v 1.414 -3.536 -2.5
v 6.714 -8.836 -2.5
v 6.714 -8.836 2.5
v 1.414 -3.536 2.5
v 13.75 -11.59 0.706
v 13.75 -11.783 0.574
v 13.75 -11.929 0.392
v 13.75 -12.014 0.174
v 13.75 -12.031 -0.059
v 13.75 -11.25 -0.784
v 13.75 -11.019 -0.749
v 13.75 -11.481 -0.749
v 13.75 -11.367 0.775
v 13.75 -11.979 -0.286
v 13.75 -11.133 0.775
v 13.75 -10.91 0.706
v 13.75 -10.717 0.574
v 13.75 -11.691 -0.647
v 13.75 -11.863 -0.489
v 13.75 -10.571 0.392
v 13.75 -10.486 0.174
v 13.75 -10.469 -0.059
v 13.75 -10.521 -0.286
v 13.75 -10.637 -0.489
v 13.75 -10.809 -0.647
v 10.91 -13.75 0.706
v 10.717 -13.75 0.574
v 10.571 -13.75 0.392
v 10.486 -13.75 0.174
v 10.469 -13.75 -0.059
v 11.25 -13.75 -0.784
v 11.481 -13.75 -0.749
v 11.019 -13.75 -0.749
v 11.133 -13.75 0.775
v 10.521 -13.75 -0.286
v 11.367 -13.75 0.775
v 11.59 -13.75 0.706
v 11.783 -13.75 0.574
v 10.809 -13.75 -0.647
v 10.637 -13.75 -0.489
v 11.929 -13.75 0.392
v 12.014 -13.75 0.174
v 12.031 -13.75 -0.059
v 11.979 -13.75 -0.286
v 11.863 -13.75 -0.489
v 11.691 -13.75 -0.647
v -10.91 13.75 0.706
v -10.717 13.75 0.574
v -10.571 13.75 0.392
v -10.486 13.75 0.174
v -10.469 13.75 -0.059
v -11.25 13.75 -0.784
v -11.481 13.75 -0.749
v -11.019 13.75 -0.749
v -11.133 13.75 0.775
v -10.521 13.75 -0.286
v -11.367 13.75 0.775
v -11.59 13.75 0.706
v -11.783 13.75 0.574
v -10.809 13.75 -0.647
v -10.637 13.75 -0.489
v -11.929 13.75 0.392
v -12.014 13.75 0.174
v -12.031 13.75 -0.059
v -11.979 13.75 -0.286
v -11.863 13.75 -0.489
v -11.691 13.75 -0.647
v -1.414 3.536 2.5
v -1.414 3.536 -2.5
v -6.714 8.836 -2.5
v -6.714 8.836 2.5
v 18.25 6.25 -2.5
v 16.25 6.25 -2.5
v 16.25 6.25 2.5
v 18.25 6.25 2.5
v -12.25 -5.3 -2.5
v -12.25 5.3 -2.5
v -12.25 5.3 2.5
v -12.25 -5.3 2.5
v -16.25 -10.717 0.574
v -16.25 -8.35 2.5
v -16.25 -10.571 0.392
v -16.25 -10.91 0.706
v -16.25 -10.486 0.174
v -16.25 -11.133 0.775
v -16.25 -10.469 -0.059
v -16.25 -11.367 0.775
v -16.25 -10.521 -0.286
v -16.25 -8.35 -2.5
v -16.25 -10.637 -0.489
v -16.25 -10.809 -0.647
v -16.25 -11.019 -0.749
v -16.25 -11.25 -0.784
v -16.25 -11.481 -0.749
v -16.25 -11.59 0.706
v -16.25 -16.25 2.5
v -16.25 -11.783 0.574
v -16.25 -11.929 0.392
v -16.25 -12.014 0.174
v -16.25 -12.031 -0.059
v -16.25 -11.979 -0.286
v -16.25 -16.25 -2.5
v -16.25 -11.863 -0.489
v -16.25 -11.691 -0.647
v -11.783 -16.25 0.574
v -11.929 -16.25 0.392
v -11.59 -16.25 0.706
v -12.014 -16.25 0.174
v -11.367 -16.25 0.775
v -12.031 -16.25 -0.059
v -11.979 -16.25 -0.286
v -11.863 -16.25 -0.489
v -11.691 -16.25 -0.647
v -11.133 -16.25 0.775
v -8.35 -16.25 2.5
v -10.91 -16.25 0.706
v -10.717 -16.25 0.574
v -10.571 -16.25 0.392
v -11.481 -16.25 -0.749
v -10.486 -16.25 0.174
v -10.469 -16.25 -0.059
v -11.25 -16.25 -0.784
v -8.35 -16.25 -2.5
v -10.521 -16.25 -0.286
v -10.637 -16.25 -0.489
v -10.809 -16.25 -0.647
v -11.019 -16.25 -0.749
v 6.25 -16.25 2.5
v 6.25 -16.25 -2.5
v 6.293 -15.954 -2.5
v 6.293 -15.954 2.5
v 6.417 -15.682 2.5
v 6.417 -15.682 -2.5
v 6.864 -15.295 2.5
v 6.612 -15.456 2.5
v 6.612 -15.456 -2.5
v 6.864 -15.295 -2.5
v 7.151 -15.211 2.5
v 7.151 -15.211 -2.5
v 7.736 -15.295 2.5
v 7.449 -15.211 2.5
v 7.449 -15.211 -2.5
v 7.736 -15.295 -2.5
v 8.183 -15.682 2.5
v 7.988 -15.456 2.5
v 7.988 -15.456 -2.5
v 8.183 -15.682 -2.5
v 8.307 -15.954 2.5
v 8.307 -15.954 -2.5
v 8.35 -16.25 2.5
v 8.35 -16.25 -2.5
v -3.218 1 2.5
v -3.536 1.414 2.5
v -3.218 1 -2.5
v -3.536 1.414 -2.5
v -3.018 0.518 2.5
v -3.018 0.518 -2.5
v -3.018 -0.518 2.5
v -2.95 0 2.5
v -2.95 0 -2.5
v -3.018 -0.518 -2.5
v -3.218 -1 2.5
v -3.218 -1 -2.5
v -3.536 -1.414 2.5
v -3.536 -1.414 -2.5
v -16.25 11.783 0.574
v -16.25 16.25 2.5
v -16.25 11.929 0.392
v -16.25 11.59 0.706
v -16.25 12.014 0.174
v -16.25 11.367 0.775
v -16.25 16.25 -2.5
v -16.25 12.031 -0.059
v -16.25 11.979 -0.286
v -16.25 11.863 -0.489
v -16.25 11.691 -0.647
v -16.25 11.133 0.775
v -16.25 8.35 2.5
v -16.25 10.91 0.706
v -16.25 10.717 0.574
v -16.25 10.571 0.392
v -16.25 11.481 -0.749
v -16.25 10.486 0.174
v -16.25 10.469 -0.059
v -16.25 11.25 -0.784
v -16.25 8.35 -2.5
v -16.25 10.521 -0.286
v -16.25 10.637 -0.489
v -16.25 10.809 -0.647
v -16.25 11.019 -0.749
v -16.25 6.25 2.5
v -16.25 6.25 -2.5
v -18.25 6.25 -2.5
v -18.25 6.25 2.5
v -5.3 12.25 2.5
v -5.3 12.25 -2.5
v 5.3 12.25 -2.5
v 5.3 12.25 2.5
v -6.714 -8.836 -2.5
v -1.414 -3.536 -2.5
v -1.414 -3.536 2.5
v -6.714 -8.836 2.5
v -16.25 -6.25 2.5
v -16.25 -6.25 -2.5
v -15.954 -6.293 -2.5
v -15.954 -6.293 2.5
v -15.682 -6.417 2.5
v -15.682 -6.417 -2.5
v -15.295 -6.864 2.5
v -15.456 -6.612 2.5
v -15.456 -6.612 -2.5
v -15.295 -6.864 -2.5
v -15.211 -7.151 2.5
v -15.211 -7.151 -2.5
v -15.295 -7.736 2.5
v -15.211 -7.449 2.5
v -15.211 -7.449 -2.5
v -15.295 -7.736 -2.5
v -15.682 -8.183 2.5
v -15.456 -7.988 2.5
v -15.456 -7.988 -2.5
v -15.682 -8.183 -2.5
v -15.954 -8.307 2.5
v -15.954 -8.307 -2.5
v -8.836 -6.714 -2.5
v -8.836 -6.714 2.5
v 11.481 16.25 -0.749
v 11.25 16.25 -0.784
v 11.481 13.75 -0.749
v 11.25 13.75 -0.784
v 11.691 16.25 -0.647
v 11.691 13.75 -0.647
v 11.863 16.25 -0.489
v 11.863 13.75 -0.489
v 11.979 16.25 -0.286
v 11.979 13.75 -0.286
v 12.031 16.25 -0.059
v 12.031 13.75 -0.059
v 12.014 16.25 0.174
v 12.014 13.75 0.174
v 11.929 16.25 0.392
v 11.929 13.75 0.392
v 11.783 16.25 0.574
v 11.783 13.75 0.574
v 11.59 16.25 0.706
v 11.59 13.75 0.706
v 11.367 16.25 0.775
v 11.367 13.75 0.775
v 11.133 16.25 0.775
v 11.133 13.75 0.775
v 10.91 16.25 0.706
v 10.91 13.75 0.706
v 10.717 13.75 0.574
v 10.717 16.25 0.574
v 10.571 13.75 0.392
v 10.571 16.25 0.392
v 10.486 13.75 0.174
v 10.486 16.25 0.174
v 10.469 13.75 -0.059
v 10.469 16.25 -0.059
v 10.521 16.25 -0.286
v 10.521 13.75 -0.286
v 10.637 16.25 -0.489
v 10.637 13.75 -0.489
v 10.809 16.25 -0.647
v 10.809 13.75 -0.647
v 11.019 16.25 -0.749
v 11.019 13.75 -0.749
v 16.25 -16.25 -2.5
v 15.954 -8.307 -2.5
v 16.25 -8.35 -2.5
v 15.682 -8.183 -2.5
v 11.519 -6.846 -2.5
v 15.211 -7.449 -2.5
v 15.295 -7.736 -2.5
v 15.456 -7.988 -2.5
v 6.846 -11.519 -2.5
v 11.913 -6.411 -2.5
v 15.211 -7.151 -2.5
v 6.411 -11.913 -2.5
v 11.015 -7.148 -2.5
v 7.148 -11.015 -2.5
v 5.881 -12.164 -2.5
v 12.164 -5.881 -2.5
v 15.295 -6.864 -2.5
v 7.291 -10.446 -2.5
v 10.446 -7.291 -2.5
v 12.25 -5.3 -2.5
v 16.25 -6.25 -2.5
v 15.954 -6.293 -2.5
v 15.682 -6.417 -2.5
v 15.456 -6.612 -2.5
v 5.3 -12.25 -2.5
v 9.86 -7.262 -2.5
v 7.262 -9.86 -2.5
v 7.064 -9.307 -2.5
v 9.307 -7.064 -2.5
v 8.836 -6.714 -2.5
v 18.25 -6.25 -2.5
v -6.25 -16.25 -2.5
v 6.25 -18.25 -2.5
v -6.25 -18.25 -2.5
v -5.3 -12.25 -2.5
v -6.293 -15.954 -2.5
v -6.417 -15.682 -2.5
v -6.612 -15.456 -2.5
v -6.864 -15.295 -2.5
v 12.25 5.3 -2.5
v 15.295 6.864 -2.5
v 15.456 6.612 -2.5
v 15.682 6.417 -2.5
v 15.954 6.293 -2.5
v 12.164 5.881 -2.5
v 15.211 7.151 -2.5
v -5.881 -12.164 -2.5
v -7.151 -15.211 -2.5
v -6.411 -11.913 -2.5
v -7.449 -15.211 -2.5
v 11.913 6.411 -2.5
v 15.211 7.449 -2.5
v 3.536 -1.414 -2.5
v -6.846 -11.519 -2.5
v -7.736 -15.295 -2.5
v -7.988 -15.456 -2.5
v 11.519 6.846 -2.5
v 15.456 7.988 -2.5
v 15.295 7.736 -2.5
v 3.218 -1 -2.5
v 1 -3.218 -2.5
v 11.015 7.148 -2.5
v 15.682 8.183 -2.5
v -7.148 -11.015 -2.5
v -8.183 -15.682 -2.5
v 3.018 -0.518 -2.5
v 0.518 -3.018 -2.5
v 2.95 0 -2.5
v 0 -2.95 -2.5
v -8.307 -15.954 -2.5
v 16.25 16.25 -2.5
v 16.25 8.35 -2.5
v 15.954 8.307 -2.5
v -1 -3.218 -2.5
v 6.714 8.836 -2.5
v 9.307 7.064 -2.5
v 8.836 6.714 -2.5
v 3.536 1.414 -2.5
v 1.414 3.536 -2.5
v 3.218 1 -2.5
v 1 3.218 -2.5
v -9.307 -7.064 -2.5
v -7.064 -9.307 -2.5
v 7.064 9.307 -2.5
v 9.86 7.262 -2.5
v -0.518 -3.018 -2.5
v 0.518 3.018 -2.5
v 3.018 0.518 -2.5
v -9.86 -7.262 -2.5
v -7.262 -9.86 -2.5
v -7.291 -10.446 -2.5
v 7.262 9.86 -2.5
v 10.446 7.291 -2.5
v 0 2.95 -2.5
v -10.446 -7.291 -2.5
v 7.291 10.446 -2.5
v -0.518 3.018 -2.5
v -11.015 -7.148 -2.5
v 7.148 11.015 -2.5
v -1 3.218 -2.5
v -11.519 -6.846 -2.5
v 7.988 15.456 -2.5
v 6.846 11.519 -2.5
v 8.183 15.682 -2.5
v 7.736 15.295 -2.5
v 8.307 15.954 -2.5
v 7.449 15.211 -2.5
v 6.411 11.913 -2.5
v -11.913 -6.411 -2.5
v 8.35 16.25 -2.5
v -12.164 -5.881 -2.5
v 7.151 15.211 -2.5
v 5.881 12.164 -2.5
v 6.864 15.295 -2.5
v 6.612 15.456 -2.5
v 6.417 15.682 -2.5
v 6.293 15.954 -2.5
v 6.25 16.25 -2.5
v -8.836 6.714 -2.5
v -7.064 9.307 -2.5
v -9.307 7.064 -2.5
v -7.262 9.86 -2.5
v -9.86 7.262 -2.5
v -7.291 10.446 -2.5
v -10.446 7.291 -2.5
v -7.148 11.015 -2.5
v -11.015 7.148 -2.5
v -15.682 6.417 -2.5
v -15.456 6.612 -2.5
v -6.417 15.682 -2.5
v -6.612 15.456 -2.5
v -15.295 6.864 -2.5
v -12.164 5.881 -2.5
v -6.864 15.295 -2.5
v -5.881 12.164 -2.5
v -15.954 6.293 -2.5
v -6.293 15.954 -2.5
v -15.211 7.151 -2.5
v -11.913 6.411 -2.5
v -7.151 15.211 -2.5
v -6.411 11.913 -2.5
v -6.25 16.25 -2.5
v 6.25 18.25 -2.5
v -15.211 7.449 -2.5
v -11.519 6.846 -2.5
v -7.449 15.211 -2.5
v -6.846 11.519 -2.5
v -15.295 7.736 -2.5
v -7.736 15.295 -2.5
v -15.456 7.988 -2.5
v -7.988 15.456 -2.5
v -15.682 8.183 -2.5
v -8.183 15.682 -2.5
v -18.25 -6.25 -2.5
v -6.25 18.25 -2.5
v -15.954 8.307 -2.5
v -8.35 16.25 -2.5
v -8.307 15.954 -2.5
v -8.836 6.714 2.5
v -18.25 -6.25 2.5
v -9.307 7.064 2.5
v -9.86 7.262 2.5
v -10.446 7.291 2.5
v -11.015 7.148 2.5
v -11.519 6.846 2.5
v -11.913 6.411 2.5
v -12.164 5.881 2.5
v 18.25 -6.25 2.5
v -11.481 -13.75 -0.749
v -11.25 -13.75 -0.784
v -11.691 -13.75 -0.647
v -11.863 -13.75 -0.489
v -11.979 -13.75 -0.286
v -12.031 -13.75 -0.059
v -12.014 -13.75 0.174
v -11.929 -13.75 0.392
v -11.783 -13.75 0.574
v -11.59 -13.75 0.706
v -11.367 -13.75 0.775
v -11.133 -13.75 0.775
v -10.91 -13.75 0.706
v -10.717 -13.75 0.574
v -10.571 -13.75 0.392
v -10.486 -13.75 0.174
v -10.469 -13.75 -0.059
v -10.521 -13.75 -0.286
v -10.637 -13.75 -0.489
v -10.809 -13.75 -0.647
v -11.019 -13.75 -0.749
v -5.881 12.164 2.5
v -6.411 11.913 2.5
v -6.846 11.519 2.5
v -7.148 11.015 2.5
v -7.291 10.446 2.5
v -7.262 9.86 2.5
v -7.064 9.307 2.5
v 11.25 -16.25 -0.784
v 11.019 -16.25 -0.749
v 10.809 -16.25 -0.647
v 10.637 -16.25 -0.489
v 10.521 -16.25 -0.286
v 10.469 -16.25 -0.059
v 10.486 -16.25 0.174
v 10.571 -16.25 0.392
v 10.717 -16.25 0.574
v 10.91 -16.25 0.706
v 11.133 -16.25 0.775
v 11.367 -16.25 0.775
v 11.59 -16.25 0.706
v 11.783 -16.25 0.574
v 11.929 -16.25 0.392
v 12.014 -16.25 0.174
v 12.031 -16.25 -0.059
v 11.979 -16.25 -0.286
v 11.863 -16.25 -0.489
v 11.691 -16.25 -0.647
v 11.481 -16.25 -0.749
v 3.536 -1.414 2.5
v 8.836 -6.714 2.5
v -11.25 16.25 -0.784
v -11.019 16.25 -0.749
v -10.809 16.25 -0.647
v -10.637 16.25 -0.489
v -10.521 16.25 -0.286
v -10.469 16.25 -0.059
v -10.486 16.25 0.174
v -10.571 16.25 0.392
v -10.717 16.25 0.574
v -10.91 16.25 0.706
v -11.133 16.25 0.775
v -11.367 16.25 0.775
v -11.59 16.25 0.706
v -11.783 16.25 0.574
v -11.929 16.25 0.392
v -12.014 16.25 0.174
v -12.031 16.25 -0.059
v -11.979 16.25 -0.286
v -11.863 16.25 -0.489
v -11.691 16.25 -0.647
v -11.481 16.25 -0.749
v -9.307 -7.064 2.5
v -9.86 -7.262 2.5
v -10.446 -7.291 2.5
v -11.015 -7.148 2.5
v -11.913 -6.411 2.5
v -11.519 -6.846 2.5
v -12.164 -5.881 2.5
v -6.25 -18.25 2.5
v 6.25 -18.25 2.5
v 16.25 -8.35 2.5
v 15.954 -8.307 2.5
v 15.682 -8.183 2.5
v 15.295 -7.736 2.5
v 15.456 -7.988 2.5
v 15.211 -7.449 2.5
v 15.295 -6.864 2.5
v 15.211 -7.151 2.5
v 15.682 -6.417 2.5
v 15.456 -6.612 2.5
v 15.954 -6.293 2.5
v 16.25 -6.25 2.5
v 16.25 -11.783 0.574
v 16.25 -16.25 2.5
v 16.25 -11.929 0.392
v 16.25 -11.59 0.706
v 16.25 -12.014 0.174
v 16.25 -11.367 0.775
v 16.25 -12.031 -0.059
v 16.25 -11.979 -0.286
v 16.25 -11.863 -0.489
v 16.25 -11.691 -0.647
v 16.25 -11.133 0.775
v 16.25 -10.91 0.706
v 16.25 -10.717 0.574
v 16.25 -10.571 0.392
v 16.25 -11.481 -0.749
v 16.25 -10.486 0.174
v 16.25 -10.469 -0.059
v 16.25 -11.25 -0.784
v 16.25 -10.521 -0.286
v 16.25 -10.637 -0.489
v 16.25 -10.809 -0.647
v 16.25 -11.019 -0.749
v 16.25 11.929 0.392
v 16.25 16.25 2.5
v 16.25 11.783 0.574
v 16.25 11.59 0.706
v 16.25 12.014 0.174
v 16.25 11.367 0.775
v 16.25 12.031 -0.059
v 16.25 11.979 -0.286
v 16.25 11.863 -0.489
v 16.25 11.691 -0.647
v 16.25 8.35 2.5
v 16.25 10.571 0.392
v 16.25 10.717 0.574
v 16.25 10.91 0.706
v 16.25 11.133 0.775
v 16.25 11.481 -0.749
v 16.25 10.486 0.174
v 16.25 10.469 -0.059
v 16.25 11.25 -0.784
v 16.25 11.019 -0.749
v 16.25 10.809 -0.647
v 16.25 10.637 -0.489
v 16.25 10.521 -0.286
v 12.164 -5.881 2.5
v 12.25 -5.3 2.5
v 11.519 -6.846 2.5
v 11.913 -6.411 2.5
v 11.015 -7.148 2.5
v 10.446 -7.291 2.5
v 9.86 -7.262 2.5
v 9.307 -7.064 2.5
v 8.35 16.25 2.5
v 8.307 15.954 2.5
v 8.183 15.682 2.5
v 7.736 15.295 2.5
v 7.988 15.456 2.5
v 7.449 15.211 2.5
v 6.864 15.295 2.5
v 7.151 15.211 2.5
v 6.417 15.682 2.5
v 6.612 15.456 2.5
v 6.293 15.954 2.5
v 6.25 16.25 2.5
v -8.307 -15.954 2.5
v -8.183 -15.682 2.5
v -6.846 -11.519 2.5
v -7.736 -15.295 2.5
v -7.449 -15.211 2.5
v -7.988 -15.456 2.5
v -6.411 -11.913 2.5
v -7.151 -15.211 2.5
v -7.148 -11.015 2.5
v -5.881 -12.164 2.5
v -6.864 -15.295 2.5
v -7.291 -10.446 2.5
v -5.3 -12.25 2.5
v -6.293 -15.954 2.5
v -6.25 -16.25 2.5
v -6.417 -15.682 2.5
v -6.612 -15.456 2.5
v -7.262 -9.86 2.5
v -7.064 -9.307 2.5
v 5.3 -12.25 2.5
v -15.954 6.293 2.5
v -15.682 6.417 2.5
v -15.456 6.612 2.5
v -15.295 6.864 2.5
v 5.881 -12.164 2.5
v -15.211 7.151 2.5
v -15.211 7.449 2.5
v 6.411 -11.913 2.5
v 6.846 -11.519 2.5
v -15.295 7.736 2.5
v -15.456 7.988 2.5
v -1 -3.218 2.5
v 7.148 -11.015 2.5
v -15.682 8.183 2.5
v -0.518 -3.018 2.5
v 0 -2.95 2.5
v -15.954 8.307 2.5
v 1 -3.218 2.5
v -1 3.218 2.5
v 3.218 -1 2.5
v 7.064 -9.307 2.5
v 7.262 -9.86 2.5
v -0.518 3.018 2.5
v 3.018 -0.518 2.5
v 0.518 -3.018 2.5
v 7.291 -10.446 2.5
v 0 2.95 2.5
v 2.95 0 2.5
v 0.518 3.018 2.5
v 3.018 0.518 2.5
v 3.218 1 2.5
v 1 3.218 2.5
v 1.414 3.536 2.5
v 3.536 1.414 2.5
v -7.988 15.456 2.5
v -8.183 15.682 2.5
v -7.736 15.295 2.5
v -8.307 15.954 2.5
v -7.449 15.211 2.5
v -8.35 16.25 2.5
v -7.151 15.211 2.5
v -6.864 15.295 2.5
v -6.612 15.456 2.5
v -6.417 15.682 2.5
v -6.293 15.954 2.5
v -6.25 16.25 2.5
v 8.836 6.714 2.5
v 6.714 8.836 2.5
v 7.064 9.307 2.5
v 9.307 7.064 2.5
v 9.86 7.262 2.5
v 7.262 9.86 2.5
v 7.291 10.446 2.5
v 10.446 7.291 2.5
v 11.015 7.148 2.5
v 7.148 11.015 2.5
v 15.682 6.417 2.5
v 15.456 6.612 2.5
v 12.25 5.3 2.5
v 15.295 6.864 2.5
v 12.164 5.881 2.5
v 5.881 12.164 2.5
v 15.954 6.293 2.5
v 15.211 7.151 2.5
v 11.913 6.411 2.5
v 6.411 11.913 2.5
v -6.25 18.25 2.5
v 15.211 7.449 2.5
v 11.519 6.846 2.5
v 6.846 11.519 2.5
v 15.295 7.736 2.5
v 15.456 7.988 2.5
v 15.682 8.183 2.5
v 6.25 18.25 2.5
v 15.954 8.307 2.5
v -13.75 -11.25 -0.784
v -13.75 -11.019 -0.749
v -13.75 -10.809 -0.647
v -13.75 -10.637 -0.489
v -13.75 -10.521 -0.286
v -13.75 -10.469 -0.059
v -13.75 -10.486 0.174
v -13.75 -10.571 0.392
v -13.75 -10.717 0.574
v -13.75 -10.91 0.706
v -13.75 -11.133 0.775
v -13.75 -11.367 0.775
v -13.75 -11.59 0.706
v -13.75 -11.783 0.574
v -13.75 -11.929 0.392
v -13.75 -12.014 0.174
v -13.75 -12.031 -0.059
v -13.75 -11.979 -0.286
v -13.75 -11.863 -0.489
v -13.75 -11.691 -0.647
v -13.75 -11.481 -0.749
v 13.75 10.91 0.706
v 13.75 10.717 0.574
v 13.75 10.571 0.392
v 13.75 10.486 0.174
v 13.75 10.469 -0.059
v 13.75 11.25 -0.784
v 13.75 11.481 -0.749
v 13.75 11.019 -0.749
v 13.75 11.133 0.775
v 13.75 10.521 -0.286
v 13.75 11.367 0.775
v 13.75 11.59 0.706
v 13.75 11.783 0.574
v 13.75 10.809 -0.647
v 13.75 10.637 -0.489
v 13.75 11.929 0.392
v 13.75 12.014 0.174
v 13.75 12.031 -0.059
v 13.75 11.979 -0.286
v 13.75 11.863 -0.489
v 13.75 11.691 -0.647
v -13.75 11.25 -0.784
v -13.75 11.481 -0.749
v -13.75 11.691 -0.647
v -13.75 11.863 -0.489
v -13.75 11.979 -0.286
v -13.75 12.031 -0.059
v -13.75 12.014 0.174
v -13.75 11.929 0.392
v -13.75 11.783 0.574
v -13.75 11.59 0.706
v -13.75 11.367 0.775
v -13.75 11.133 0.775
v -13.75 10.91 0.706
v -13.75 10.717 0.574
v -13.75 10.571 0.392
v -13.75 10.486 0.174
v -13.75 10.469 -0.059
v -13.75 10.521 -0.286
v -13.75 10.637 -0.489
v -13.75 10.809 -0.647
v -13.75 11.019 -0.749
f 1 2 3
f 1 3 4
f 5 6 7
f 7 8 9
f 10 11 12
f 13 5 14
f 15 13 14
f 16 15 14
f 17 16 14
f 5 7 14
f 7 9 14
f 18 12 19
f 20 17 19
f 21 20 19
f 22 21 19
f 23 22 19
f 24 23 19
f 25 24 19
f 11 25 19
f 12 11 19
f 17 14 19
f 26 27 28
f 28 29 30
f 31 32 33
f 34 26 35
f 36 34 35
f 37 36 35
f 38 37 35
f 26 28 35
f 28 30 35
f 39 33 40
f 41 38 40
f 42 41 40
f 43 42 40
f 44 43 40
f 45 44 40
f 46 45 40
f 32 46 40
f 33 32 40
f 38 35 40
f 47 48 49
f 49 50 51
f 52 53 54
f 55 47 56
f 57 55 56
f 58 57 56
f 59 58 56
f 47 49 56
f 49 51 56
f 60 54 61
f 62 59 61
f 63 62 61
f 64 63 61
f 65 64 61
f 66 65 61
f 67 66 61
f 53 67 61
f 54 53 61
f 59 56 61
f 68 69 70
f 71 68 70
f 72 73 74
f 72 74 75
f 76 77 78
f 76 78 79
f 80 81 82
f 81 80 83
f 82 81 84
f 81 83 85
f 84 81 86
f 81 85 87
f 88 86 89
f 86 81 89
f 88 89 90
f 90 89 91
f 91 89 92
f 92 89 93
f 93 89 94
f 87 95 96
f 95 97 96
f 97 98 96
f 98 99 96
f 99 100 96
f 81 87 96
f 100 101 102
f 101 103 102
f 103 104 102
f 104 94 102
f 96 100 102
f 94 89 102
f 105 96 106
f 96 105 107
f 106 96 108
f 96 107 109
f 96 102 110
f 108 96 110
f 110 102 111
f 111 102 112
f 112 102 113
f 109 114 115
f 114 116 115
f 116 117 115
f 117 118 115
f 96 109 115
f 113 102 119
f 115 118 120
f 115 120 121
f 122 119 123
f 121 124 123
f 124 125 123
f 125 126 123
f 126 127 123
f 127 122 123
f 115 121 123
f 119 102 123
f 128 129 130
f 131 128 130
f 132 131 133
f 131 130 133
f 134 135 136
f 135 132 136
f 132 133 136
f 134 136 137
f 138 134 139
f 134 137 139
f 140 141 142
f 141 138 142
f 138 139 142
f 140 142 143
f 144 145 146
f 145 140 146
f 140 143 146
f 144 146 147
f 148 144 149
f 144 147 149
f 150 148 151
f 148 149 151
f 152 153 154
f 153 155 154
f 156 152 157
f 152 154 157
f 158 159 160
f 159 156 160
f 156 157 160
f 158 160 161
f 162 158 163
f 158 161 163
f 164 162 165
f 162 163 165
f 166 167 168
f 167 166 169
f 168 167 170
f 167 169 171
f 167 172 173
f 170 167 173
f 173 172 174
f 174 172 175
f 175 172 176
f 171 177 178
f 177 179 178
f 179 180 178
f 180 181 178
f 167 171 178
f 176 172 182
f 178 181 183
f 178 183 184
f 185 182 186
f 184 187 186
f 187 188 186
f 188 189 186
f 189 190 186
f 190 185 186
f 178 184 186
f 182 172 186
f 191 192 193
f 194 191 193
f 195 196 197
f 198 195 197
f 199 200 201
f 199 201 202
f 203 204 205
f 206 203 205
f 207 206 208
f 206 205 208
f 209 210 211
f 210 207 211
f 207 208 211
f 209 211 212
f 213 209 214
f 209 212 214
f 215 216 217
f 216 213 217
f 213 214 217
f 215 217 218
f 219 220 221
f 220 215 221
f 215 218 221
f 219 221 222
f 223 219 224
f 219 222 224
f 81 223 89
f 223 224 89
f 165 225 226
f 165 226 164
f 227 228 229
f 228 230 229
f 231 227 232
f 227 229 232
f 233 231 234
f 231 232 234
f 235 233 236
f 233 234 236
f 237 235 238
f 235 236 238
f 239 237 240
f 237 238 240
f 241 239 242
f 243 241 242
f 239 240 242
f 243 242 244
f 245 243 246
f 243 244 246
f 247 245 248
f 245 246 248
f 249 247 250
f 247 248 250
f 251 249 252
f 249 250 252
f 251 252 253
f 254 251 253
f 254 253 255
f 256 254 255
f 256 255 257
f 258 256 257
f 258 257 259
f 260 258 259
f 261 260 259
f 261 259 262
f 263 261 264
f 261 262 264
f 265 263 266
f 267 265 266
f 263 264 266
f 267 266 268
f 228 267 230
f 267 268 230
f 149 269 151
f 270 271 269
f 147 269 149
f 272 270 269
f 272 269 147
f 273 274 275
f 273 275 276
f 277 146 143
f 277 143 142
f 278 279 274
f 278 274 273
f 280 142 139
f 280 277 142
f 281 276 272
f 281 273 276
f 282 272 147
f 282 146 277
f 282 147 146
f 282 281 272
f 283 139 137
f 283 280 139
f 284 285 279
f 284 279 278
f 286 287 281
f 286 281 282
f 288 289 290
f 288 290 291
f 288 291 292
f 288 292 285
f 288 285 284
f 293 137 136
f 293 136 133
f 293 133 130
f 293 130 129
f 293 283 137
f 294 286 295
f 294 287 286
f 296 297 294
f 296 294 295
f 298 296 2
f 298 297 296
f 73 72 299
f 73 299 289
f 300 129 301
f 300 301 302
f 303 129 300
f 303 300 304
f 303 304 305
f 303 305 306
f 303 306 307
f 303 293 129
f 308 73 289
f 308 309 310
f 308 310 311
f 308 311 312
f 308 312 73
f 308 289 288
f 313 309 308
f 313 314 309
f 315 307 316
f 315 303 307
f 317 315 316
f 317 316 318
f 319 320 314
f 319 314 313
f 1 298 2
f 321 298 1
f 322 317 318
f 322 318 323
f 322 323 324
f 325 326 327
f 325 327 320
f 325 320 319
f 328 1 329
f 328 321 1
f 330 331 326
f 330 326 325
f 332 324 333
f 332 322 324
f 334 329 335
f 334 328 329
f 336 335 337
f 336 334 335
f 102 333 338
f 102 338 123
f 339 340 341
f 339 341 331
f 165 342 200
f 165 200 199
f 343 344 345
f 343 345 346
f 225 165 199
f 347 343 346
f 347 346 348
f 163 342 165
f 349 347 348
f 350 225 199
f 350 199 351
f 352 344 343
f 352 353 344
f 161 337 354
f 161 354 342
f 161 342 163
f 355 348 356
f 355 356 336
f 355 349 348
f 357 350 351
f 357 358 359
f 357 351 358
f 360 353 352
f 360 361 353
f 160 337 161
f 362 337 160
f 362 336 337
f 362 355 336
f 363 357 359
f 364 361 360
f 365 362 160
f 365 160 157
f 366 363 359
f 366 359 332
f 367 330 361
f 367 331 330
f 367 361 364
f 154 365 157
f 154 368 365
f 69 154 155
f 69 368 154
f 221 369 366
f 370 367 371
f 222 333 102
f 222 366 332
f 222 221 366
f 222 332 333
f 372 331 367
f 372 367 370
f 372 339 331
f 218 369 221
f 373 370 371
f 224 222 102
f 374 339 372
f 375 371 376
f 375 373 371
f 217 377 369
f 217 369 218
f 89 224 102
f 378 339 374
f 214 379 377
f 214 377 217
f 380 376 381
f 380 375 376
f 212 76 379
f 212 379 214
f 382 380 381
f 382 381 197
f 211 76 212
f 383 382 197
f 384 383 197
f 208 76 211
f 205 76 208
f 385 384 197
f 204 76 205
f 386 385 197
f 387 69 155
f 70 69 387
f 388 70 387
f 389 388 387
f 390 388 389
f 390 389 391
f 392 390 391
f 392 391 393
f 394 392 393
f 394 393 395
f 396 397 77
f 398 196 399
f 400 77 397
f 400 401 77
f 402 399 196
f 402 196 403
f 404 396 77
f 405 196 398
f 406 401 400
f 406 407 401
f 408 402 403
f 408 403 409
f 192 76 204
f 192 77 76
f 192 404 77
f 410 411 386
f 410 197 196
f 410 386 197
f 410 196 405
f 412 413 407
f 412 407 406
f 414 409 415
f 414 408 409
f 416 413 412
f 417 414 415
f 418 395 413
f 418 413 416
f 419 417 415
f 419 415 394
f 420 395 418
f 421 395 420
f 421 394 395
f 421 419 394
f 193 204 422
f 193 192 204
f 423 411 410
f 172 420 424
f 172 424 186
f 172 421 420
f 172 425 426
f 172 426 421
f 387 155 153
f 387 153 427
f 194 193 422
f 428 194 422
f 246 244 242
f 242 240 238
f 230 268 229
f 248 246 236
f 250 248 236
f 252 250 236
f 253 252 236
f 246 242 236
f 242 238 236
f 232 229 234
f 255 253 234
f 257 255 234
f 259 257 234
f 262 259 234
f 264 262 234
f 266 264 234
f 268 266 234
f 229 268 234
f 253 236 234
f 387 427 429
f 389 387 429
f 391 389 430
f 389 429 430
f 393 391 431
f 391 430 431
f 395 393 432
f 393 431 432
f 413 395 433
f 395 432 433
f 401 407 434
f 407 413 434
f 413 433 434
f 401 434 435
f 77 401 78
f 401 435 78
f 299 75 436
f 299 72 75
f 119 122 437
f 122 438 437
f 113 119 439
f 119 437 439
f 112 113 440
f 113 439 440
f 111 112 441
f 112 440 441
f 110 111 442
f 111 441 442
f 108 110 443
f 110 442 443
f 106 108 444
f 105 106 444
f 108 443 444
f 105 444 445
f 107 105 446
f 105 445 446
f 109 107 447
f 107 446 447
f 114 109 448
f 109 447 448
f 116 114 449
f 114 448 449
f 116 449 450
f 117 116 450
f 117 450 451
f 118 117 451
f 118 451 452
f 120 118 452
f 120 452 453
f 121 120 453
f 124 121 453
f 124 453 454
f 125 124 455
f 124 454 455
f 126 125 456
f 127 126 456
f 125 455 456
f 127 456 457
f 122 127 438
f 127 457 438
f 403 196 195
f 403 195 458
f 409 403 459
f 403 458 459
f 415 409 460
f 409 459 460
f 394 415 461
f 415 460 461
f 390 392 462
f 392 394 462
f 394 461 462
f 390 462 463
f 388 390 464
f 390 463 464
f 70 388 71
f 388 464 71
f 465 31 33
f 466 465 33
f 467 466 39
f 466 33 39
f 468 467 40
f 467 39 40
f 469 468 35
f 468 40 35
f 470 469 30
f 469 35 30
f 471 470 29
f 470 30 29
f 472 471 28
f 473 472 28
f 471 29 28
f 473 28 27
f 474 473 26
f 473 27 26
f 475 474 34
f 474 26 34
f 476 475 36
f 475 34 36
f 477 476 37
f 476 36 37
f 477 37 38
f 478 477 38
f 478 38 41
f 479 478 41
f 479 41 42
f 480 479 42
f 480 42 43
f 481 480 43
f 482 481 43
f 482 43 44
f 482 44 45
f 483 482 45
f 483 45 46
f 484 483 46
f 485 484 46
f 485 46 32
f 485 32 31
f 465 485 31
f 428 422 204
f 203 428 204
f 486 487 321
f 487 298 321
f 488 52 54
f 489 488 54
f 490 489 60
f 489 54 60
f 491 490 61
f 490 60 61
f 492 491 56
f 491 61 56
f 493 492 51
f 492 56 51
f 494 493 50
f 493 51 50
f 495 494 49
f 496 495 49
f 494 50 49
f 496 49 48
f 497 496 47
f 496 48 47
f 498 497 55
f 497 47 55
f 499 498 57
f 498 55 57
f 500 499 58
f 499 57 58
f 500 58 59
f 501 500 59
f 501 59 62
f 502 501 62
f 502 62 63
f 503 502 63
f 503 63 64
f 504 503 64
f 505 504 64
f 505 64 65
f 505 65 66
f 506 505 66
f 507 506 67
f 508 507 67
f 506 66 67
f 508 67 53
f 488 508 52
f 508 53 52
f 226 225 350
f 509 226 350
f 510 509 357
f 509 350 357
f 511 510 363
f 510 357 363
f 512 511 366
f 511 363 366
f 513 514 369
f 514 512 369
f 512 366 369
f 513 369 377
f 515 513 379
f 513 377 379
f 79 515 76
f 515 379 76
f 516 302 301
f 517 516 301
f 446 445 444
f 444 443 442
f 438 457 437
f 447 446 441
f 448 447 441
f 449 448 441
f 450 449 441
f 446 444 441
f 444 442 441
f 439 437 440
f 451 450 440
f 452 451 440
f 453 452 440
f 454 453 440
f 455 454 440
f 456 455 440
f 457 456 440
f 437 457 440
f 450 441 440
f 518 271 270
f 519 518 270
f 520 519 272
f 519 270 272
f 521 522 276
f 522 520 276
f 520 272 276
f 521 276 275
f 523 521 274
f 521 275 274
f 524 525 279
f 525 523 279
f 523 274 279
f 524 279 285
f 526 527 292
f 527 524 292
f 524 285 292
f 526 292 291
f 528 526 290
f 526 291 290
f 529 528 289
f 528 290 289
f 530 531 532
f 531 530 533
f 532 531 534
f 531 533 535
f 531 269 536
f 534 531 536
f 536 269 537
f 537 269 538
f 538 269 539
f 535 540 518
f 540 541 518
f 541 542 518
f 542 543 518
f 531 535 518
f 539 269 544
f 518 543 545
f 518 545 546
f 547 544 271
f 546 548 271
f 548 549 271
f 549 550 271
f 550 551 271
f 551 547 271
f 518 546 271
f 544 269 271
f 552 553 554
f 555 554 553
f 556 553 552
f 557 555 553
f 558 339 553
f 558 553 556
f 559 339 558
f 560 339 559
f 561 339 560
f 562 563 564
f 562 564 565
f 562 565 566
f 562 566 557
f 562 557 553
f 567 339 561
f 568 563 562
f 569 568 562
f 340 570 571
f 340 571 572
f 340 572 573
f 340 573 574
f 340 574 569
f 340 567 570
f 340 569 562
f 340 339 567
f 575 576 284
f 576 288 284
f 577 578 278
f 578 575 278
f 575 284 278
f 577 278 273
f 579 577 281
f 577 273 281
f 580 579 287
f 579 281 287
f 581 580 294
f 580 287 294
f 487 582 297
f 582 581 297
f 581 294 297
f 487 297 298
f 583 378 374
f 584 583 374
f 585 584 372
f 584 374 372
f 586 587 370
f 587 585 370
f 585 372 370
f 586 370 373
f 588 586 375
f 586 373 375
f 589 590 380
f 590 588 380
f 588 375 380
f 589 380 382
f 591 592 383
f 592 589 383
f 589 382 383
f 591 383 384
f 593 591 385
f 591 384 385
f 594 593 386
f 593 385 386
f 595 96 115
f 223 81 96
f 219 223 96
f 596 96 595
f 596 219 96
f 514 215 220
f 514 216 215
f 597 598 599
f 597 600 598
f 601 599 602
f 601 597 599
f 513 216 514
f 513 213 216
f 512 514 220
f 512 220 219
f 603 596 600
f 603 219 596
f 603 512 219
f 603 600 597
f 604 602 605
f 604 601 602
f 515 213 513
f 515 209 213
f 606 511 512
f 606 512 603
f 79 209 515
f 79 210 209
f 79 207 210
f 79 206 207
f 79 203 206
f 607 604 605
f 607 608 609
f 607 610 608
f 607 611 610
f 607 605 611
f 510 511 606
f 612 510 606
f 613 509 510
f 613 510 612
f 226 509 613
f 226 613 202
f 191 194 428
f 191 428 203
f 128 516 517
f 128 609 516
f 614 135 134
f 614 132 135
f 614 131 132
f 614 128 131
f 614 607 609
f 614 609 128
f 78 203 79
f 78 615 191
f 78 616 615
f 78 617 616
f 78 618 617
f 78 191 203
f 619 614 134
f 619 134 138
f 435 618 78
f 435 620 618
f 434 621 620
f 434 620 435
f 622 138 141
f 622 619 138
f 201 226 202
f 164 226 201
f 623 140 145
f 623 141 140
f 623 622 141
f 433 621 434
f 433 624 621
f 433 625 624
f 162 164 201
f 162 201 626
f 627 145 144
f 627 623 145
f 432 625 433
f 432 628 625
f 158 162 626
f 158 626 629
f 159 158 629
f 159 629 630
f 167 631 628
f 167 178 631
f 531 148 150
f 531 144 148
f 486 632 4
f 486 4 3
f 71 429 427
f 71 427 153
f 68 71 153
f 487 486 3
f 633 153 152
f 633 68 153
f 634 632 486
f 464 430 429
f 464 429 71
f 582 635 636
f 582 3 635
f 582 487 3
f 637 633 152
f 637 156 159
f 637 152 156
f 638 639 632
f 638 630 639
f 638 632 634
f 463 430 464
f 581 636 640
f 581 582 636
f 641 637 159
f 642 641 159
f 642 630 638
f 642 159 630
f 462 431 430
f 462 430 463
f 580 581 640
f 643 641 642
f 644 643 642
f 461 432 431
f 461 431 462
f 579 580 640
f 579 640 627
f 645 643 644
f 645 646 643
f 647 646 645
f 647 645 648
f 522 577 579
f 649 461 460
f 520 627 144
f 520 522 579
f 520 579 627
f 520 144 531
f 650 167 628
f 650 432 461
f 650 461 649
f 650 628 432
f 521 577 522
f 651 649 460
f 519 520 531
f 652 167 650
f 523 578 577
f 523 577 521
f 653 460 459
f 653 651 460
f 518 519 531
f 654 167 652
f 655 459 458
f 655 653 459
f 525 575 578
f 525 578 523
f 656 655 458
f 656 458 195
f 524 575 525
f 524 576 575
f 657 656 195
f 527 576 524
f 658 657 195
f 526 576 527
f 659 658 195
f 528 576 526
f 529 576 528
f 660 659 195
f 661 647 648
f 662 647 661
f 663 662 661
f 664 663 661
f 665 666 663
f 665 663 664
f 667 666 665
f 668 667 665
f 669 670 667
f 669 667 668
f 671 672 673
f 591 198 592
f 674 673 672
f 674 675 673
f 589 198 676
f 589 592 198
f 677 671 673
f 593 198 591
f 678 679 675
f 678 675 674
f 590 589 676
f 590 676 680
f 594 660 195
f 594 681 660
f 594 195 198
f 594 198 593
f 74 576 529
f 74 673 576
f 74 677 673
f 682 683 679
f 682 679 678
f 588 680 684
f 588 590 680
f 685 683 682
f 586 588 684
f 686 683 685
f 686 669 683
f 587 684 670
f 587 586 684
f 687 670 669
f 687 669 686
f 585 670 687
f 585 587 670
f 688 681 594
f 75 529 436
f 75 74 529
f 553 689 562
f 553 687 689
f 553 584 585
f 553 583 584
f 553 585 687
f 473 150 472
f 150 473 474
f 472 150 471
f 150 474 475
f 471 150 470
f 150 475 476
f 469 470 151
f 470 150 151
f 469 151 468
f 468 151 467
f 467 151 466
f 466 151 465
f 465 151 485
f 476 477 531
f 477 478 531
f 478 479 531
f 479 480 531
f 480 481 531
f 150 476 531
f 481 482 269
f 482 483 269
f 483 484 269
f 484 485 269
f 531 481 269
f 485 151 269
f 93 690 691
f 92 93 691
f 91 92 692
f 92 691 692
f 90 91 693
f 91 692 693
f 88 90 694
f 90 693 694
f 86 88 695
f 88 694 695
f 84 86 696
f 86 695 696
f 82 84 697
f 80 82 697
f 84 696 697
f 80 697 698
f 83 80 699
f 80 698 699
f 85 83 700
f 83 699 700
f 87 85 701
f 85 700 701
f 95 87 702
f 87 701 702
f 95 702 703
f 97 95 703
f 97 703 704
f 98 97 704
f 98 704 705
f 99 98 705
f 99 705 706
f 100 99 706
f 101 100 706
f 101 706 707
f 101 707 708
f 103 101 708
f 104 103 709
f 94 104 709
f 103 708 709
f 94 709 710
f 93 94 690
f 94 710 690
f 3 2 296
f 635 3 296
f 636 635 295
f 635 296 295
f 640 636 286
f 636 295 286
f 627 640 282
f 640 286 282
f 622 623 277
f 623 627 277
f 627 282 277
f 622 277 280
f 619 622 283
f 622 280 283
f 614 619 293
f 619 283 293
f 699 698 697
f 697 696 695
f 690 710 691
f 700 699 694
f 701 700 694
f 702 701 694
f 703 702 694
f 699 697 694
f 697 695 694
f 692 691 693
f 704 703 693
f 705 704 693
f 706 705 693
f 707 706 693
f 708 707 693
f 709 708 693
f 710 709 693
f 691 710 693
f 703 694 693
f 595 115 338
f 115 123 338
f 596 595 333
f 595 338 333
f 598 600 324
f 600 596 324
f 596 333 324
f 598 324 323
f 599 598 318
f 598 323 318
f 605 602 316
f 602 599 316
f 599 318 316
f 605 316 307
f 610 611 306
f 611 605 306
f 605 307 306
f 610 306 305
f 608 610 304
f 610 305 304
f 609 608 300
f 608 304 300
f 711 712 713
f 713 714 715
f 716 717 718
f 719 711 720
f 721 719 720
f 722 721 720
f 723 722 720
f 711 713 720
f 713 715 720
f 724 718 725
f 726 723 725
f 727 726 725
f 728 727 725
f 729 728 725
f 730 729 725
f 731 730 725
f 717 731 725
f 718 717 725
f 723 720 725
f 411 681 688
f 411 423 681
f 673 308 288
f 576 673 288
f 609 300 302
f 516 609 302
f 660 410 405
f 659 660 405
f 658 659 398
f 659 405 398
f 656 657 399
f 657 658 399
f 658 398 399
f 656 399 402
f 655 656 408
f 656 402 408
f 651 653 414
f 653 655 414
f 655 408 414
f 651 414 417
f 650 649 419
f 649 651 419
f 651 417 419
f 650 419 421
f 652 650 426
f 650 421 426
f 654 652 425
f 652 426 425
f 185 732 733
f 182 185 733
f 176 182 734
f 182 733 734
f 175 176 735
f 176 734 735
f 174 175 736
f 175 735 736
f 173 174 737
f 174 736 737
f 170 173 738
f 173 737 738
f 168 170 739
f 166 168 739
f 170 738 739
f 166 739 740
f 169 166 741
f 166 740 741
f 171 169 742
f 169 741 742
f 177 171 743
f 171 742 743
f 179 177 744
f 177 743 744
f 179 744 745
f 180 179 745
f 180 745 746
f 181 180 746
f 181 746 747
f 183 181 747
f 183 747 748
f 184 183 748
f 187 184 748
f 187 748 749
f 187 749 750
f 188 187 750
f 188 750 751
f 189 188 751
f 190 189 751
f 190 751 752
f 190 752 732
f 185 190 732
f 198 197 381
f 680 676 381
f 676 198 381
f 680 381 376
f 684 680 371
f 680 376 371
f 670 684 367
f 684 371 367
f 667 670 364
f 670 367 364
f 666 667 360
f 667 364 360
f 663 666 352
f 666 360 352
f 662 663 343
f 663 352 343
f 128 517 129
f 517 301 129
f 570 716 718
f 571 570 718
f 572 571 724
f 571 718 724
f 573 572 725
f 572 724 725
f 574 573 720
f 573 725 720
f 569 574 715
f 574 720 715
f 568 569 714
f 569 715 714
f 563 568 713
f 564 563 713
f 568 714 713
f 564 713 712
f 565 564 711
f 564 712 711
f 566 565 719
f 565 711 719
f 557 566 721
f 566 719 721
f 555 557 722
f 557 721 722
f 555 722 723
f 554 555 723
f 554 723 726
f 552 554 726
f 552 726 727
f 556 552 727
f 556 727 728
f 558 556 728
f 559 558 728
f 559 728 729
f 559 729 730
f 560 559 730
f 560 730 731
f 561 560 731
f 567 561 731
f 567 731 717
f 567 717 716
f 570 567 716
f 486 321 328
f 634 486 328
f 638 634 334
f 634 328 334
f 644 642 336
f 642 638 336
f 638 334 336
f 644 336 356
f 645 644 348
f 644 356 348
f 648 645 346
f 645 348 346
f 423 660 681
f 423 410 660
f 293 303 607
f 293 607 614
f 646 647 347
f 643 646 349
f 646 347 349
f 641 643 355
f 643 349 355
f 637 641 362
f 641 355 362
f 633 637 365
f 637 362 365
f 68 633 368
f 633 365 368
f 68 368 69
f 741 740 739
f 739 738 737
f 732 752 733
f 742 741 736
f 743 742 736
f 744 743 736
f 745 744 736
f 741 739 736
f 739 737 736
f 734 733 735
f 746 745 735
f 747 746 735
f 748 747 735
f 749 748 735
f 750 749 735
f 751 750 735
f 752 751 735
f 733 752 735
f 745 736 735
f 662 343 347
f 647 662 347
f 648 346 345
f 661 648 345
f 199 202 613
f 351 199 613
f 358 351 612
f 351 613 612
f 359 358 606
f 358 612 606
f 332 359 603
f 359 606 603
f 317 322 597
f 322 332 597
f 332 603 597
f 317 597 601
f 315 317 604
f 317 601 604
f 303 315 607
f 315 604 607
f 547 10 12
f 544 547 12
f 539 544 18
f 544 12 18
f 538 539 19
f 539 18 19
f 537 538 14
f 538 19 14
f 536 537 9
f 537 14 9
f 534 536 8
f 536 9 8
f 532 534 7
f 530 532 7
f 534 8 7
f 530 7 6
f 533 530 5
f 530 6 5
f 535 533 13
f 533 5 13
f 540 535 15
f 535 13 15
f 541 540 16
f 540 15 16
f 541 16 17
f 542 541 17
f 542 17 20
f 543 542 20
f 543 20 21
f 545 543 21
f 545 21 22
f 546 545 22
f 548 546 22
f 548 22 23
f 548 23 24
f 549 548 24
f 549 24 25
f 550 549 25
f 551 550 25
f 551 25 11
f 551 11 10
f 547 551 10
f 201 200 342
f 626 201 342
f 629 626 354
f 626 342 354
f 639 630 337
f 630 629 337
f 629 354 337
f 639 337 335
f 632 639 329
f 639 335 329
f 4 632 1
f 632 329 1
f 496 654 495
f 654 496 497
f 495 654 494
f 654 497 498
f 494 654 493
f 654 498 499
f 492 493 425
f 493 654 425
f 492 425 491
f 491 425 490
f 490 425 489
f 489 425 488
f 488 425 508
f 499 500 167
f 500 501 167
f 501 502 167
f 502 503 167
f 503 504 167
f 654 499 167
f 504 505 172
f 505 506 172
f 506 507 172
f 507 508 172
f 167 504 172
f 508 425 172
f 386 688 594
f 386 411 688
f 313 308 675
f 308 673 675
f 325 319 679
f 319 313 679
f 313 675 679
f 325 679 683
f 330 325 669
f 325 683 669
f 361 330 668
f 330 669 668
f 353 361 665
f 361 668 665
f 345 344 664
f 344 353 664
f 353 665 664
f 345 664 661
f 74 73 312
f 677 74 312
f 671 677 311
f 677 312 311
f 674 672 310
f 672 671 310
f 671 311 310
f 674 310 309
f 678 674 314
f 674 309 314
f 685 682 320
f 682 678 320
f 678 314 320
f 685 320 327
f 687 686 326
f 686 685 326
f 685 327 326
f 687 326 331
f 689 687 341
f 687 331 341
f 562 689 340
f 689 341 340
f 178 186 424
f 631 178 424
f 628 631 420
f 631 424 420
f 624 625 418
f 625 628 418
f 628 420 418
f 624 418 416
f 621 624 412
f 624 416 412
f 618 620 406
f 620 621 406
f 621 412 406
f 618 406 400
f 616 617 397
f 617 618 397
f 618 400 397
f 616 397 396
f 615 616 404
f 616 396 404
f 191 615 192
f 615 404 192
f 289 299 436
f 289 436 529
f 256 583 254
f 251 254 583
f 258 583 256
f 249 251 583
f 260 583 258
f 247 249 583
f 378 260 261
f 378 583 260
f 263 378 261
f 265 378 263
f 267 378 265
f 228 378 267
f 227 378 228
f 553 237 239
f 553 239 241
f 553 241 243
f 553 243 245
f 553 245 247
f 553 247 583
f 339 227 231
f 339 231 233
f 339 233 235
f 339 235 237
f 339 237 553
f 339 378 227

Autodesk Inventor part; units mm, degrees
ref_plane "YZ Plane" through (0, 0, 0) normal (1, 0, 0) x (0, 1, 0)
ref_plane "XZ Plane" through (0, 0, 0) normal (0, 1, 0) x (-1, 0, 0)
ref_plane "XY Plane" through (0, 0, 0) normal (0, 0, 1) x (1, 0, 0)
sketch "スケッチ1" plane through (0, 0, 0) normal (0, 0, 1) x (1, 0, 0)
  line L0 (-16.25, -16.25) -> (16.25, -16.25) construction
  line L1 (16.25, -16.25) -> (16.25, 16.25) construction
  line L2 (16.25, 16.25) -> (-16.25, 16.25) construction
  line L3 (-16.25, 16.25) -> (-16.25, -16.25) construction
  line L4 (-16.25, -16.25) -> (16.25, 16.25) construction
  line L5 (16.25, -16.25) -> (-16.25, 16.25) construction
  line L6 (-8.35, 16.25) -> (-16.25, 16.25)
  line L7 (-16.25, 16.25) -> (-16.25, 8.35)
  line L8 (8.35, 16.25) -> (16.25, 16.25)
  line L9 (16.25, 16.25) -> (16.25, 8.35)
  line L10 (-16.25, -8.35) -> (-16.25, -16.25)
  line L11 (-16.25, -16.25) -> (-8.35, -16.25)
  line L12 (8.35, -16.25) -> (16.25, -16.25)
  line L13 (16.25, -16.25) -> (16.25, -8.35)
  line L14 (-6.25, 16.25) -> (-6.25, 18.25)
  line L15 (-6.25, 18.25) -> (6.25, 18.25)
  line L16 (6.25, 18.25) -> (6.25, 16.25)
  arc A0 (-8.35, 16.25) -> (-6.25, 16.25) centre (-7.3, 16.25) ccw
  arc A1 (6.25, 16.25) -> (8.35, 16.25) centre (7.3, 16.25) ccw
  line L17 (0, 16.25) -> (0, 0) construction
  line L18 (0, 0) -> (16.25, 0) construction
  line L19 (-16.25, 6.25) -> (-18.25, 6.25)
  line L20 (-18.25, 6.25) -> (-18.25, -6.25)
  line L21 (-18.25, -6.25) -> (-16.25, -6.25)
  arc A2 (-16.25, 6.25) -> (-16.25, 8.35) centre (-16.25, 7.3) ccw
  arc A3 (-16.25, -8.35) -> (-16.25, -6.25) centre (-16.25, -7.3) ccw
  line L22 (-6.25, -16.25) -> (-6.25, -18.25)
  line L23 (-6.25, -18.25) -> (6.25, -18.25)
  line L24 (6.25, -18.25) -> (6.25, -16.25)
  arc A4 (-6.25, -16.25) -> (-8.35, -16.25) centre (-7.3, -16.25) ccw
  arc A5 (8.35, -16.25) -> (6.25, -16.25) centre (7.3, -16.25) ccw
  line L25 (16.25, 6.25) -> (18.25, 6.25)
  line L26 (18.25, 6.25) -> (18.25, -6.25)
  line L27 (18.25, -6.25) -> (16.25, -6.25)
  arc A6 (16.25, 8.35) -> (16.25, 6.25) centre (16.25, 7.3) ccw
  arc A7 (16.25, -6.25) -> (16.25, -8.35) centre (16.25, -7.3) ccw
  line L28 (-12.8, 16.25) -> (-9.7, 16.25) construction
  line L29 (-9.7, 16.25) -> (-9.7, 13.25) construction
  line L30 (-9.7, 13.25) -> (-12.8, 13.25) construction
  line L31 (-12.8, 13.25) -> (-12.8, 16.25) construction
  line L32 (-16.25, 12.8) -> (-13.25, 12.8) construction
  line L33 (-13.25, 12.8) -> (-13.25, 9.7) construction
  line L34 (-13.25, 9.7) -> (-16.25, 9.7) construction
  line L35 (-16.25, 9.7) -> (-16.25, 12.8) construction
  line L36 (-10.1287, 12.25) -> (10.1287, 12.25)
  line L37 (10.1287, 12.25) -> (0, 2.1213)
  line L38 (0, 2.1213) -> (-10.1287, 12.25)
  line L39 (-12.25, 10.1287) -> (-12.25, -10.1287)
  line L40 (-12.25, -10.1287) -> (-2.1213, 0)
  line L41 (-2.1213, 0) -> (-12.25, 10.1287)
  line L42 (-10.1287, -12.25) -> (10.1287, -12.25)
  line L43 (10.1287, -12.25) -> (0, -2.1213)
  line L44 (0, -2.1213) -> (-10.1287, -12.25)
  line L45 (12.25, 10.1287) -> (12.25, -10.1287)
  line L46 (12.25, -10.1287) -> (2.1213, 0)
  line L47 (2.1213, 0) -> (12.25, 10.1287)
  line L48 (-11.25, 16.25) -> (-11.25, 13.25) construction
  line L49 (-13.25, 11.25) -> (-16.25, 11.25) construction
  dimension "d0" = 32.5
  dimension "d1" = 1.05
  dimension "d2" = 2
  dimension "d3" = 10
  dimension "d4" = 3.1
  dimension "d6" = 3
  dimension "d8" = 3
  dimension "d9" = 3
  dimension "d10" = 3
  dimension "d11" = 3
  dimension "d12" = 3
  dimension "d13" = 4
  dimension "d17" = 5
  dimension "d18" = 5
extrude "押し出し1" add sketch "スケッチ1" along normal blind 2.5
mirror "ミラー1" about plane through (0, 0, 0) normal (0, 0, -1) of "押し出し1"
sketch "スケッチ2" plane through (-16.25, -16.25, 2.5) normal (0, -1, 0) x (1, 0, 0)
  line L0 (0, -5) -> (0, 0) projected
  line L1 (10, 0) -> (22.5, 0) construction
  line L2 (16.25, 0) -> (16.25, -5) construction
  point P0 (16.25, -2.5)
  point P1 (5, -2.5)
  point P2 (27.5, -2.5)
  point P3 (0, -2.5)
  dimension "d19" = 5
hole "穴1" at (-11.25, -16.25, 0) at (11.25, -16.25, 0) direction (0, 1, 0) diameter 1.567 depth 2.5 thread size "M2x0.4" class "6H" standard "ISO Metric profile"
pattern_circular "円形状パターン1" count 4 over 360 about axis through (0, 0, -10) along (0, 0, 1) of "穴1"
fillet "フィレット1" radius 2 12 edges at (12.25, 10.1287, 0) (12.25, -10.1287, 0) (10.1287, -12.25, 0) (0, 2.1213, 0) (-2.1213, 0, 0) (-10.1287, -12.25, 0) (-12.25, -10.1287, 0) (10.1287, 12.25, 0) (-12.25, 10.1287, 0) (-10.1287, 12.25, 0) (0, -2.1213, 0) (2.1213, 0, 0)
equation "\"d8\" = d6"
equation "\"d10\" = d9"
equation "\"d11\" = d10"
equation "\"d12\" = d11"
equation "\"d18\" = d17"
equation "\"d19\" = d17"
properties part number "上腕_メインフレーム_1_1" material "アセタール樹脂、黒"
